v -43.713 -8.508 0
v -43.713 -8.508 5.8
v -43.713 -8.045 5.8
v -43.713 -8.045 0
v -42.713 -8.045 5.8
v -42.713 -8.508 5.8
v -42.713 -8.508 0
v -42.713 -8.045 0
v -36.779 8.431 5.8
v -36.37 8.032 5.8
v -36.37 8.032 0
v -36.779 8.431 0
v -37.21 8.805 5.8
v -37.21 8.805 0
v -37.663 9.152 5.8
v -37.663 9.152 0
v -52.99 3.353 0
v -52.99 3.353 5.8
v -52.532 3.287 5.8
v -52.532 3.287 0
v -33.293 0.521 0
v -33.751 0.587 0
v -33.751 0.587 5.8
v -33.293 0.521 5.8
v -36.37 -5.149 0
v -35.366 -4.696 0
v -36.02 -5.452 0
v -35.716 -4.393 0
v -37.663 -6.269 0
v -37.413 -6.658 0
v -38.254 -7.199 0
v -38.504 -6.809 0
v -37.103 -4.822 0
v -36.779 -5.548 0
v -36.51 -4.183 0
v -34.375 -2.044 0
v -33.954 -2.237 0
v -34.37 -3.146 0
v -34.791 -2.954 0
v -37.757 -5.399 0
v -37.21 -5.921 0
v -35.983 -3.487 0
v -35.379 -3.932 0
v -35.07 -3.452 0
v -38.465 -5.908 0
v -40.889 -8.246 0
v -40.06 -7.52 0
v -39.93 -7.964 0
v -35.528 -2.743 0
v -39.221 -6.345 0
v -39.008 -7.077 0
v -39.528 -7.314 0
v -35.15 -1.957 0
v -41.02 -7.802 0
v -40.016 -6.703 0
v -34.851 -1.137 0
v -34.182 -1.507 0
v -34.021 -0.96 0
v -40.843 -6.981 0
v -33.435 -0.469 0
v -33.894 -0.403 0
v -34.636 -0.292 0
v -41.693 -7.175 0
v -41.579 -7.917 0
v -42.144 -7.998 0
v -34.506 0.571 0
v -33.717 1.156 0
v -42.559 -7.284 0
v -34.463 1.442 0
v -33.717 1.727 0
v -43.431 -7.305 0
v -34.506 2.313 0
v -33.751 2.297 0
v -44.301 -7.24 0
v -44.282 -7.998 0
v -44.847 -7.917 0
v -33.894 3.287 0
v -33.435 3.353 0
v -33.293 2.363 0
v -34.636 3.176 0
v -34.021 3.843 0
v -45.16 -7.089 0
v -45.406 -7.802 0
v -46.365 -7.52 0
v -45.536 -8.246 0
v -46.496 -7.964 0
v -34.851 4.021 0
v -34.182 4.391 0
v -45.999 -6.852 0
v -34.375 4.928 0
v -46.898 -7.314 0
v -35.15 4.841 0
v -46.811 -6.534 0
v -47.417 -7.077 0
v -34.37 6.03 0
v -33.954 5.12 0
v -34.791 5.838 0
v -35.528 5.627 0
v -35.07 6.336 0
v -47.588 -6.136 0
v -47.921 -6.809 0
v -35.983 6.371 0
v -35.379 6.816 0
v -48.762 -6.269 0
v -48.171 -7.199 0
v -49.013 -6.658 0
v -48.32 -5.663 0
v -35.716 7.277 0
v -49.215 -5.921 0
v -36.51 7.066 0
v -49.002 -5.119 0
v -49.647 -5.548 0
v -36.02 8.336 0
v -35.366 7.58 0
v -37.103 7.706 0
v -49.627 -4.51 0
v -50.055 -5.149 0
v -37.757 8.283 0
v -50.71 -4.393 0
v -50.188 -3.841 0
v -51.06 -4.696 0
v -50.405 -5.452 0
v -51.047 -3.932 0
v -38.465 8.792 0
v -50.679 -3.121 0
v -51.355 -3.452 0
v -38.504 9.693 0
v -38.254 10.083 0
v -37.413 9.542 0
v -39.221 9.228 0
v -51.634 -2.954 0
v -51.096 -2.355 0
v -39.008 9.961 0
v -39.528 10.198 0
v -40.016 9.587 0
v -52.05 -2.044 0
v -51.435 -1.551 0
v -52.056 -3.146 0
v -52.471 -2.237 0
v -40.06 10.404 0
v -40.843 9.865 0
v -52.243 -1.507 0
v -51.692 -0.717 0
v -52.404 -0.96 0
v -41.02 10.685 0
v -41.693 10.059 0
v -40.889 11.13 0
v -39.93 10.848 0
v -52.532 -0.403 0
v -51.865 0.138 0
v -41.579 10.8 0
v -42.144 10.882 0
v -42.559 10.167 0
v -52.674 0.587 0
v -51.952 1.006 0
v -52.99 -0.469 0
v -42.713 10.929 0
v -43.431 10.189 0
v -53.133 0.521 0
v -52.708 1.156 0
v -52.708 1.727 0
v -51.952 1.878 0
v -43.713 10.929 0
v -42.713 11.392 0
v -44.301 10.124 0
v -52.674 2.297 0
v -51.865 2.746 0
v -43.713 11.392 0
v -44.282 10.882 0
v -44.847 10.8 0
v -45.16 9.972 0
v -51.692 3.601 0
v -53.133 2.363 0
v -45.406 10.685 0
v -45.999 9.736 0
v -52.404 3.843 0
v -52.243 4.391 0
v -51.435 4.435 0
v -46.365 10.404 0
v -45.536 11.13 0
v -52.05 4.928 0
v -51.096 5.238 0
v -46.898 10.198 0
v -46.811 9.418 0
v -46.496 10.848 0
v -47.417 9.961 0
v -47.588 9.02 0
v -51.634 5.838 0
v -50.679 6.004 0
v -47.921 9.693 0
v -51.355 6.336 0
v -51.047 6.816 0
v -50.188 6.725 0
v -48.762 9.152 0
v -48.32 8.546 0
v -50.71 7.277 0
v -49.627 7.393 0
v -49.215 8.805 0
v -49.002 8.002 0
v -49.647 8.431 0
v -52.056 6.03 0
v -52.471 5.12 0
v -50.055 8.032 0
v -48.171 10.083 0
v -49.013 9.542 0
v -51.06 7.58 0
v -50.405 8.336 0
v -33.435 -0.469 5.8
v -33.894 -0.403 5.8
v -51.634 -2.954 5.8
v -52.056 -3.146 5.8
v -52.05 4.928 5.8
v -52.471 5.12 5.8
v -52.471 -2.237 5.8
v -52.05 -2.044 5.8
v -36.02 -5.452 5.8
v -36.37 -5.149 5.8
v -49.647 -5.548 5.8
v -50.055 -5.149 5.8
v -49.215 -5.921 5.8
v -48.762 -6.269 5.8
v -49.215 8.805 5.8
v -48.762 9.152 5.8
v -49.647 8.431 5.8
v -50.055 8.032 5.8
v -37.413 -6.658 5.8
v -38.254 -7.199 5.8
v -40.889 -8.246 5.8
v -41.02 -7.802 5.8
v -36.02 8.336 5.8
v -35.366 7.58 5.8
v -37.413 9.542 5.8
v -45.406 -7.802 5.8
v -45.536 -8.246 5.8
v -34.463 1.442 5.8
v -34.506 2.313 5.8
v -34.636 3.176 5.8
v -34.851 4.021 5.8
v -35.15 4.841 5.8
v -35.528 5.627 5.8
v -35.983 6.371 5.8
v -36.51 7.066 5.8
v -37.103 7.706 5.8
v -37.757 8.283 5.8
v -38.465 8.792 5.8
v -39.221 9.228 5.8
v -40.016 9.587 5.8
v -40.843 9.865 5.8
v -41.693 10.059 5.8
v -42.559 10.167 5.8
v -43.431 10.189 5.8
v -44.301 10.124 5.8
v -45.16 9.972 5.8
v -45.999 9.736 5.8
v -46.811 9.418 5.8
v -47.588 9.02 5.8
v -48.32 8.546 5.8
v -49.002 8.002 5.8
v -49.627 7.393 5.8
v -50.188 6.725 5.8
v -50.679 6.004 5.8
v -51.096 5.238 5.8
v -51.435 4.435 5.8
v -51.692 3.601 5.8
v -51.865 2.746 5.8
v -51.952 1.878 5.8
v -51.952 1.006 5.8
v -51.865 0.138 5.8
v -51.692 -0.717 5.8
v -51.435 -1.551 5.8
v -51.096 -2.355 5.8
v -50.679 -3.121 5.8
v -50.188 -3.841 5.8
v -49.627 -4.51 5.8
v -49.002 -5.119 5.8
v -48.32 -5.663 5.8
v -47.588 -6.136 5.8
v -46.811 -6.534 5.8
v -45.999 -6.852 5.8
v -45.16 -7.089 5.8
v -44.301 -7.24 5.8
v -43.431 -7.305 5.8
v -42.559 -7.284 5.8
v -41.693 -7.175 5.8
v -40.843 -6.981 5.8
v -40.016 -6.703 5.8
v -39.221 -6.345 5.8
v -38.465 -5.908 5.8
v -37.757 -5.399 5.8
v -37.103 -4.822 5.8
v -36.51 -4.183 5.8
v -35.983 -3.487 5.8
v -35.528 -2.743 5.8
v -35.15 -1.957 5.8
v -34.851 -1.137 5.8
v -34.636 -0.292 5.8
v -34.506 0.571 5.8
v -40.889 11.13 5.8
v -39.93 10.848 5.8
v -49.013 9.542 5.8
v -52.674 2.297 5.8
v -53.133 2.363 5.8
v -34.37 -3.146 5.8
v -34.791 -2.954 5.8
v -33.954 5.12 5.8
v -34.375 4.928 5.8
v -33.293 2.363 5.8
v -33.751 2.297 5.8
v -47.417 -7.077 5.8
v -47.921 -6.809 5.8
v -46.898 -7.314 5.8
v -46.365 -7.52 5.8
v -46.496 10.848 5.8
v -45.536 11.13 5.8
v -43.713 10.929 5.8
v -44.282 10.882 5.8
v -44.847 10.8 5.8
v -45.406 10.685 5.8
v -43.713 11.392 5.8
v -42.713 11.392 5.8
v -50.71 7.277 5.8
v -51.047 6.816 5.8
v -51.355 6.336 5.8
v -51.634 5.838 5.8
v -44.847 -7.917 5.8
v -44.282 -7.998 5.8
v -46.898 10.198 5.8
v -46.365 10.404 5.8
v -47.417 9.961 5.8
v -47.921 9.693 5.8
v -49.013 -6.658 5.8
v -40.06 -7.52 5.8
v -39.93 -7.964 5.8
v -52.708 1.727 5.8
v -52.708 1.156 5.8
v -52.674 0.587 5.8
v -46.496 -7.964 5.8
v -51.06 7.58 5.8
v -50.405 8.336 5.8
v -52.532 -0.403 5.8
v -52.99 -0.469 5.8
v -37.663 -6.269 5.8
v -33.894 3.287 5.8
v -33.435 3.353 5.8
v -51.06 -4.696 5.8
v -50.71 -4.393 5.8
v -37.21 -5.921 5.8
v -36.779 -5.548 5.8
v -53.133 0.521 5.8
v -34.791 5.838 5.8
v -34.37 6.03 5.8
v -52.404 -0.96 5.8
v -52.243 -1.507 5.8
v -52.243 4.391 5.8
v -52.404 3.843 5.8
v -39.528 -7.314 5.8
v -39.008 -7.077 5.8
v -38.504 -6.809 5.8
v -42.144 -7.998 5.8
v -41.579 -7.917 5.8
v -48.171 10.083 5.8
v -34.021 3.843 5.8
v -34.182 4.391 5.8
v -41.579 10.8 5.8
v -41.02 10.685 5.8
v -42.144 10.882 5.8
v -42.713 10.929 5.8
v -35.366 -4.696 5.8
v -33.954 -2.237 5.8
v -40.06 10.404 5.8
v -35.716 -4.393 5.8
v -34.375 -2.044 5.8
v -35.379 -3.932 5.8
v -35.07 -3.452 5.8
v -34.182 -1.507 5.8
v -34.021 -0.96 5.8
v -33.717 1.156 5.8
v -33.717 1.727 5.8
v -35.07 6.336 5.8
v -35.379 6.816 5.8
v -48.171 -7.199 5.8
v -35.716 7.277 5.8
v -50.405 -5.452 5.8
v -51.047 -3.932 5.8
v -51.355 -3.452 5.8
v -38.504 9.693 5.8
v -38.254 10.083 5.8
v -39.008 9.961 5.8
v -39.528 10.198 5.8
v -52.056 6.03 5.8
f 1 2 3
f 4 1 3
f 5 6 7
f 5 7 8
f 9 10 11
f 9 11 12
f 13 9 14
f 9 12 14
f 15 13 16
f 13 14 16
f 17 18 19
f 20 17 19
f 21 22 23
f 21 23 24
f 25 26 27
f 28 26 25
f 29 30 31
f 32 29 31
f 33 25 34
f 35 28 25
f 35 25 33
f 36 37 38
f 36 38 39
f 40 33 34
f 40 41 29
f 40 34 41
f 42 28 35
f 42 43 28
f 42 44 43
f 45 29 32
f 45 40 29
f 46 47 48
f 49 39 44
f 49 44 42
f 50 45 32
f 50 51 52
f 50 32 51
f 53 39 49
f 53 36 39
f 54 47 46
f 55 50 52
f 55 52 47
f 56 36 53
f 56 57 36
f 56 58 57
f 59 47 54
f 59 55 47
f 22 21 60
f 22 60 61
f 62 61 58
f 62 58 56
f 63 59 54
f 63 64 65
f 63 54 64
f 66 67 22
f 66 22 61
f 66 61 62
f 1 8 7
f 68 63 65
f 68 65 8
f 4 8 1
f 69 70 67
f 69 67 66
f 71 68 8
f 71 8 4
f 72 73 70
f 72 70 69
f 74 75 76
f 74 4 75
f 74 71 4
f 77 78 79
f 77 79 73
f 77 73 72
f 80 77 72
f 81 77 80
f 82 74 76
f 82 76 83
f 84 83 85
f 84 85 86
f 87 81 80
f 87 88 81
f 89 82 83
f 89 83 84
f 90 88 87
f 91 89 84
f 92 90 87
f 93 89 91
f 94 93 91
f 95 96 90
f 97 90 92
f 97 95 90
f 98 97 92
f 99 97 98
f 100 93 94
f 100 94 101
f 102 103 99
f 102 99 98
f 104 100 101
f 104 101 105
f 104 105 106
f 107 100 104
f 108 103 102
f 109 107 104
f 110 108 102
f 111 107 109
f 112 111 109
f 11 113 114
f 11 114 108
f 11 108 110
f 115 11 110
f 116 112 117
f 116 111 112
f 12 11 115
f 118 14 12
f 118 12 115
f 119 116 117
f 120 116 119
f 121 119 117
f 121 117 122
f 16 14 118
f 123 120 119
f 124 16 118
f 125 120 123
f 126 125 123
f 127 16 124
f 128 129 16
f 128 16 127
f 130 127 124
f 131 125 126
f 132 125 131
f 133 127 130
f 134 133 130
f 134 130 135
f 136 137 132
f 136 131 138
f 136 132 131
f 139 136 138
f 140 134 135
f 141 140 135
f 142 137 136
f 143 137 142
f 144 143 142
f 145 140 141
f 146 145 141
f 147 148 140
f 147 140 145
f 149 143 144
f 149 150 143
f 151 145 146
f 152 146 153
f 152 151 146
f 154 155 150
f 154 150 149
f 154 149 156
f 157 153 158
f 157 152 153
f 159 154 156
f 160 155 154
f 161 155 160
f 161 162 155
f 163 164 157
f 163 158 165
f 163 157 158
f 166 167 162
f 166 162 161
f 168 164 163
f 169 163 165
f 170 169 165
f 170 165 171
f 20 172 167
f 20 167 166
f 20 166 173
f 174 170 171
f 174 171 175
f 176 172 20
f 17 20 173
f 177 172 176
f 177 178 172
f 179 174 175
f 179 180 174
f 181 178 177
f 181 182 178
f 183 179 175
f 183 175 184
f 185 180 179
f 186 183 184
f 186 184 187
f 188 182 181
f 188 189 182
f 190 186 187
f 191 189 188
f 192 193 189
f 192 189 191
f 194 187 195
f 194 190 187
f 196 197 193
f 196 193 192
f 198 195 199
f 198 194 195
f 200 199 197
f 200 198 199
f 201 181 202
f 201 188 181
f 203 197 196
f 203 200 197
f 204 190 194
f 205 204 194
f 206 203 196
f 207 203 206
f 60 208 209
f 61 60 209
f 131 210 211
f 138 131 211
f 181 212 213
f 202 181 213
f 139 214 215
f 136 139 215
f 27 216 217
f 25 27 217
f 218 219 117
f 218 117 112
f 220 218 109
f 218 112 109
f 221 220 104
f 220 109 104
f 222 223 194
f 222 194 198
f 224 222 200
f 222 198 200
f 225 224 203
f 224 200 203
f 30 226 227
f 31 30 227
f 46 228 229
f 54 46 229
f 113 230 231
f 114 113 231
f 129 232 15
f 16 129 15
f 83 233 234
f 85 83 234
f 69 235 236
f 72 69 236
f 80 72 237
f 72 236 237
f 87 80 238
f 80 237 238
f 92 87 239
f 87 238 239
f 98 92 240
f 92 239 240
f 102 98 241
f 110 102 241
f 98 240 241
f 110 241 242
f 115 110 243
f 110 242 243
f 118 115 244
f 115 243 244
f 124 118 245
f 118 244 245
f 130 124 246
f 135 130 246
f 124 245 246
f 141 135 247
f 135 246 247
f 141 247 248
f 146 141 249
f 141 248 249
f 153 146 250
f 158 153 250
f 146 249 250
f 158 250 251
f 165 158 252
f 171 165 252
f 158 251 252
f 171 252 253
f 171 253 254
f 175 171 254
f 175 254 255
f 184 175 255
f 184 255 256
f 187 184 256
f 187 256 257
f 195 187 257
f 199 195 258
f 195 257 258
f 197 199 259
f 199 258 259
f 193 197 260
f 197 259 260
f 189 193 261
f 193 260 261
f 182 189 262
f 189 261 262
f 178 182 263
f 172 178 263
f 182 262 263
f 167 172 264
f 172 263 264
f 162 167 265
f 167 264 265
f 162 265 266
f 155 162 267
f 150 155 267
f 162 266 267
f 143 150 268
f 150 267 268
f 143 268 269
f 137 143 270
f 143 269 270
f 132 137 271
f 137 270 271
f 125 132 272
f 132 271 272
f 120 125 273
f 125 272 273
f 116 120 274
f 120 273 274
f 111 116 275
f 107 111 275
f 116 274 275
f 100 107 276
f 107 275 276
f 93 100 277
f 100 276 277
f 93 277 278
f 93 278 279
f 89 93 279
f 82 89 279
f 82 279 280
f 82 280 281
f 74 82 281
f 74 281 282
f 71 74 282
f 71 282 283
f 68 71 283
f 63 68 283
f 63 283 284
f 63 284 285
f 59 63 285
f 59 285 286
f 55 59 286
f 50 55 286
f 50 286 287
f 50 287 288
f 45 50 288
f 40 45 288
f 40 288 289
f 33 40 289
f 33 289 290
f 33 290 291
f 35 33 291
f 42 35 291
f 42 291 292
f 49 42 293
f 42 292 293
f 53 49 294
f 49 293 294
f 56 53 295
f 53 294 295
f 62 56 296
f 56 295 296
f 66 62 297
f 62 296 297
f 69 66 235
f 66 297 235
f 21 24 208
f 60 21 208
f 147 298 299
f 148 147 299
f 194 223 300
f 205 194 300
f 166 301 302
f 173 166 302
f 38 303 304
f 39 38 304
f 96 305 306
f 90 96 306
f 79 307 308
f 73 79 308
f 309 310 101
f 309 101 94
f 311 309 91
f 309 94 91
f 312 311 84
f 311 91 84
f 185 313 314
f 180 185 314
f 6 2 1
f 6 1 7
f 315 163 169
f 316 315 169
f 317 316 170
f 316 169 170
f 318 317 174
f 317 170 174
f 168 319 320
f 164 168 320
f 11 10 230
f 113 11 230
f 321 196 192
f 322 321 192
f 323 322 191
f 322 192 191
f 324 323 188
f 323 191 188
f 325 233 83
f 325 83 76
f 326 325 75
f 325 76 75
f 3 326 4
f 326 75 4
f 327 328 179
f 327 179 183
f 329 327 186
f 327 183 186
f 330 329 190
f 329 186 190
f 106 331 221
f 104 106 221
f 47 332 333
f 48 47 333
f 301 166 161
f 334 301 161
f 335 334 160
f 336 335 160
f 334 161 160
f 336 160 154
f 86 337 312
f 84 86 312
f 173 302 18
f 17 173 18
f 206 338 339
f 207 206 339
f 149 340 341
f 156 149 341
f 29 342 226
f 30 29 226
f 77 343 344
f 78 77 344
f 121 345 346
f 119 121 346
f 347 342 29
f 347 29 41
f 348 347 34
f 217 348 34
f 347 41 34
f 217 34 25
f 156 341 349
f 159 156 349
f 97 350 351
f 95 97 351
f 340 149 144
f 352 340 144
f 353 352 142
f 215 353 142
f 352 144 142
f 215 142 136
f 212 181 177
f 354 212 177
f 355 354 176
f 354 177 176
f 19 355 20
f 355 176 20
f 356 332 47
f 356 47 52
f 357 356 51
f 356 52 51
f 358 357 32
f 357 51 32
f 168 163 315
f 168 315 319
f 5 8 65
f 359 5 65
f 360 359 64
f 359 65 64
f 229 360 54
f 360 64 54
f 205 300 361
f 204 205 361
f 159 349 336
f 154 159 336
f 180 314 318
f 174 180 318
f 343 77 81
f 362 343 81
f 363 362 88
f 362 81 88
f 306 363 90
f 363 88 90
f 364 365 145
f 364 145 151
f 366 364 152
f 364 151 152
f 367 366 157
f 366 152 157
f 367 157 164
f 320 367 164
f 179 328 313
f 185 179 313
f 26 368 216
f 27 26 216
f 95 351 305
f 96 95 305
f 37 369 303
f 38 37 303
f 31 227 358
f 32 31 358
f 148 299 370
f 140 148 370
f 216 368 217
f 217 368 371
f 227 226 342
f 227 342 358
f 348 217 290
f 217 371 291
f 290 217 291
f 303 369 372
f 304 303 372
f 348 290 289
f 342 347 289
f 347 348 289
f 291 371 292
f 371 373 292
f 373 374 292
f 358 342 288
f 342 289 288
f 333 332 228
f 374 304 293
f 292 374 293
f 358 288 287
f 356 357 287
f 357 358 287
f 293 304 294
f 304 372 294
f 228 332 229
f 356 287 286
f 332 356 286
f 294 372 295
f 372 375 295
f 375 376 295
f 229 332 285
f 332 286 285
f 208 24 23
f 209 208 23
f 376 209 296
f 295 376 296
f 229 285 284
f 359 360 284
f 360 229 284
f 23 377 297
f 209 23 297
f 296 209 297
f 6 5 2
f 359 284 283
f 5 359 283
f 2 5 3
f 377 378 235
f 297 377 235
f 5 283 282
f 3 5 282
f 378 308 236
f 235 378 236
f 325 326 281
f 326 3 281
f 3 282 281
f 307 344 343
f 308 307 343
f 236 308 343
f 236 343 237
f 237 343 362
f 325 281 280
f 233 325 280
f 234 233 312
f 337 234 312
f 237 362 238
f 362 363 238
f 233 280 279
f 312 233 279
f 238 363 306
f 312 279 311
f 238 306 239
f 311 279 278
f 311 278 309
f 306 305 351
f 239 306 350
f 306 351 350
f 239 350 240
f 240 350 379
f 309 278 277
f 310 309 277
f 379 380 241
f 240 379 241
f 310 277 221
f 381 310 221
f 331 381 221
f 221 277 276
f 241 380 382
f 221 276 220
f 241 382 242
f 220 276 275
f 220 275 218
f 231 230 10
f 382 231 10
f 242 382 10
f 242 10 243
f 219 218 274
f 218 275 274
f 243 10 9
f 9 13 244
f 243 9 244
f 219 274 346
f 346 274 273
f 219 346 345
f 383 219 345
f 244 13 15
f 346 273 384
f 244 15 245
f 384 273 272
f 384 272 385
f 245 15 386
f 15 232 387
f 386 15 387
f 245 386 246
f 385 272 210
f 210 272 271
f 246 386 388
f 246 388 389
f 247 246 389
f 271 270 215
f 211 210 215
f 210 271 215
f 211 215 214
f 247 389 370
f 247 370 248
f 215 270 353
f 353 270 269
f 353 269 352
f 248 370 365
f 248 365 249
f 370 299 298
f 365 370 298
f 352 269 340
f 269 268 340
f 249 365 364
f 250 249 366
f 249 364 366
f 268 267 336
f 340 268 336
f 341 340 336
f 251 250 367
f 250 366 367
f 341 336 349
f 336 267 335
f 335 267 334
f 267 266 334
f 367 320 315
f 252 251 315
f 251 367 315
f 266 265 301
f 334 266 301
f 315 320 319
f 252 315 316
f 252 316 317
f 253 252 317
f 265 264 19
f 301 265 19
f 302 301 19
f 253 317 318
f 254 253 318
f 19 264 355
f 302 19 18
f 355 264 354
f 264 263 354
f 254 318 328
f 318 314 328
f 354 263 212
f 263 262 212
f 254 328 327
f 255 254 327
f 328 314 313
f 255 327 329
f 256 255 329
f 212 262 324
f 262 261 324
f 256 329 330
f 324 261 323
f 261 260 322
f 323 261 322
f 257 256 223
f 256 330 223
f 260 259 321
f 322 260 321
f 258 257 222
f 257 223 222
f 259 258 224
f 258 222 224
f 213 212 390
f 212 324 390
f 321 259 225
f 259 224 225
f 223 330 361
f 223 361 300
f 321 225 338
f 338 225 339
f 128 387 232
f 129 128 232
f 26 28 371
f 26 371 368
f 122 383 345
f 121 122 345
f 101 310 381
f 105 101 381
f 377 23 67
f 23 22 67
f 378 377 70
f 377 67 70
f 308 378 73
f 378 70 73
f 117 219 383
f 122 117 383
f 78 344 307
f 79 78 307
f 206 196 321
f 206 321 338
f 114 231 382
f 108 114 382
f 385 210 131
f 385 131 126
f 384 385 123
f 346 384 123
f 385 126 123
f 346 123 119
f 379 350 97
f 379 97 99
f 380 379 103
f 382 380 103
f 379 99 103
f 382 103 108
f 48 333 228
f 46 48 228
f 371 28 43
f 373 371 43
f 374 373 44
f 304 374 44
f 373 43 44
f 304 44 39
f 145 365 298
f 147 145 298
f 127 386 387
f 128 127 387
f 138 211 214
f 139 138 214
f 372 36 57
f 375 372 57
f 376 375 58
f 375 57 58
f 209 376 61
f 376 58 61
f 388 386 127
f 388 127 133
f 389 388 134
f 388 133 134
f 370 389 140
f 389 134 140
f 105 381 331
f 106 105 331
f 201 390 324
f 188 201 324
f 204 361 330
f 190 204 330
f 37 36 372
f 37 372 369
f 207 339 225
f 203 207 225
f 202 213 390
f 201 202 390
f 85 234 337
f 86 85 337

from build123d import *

# Parameters (mm, degrees)
SKETCH1_R           = 9.5
BOSS_EXTRUDE1_DEPTH = 5.8
SKETCH2_R           = 8.75
CUT_EXTRUDE1_DEPTH  = 5.8
SKETCH3_W           = 1
SKETCH3_H           = 1
BOSS_EXTRUDE2_DEPTH = 5.8


with BuildPart() as part:
    # Sketch1 → Boss-Extrude1 (new body)
    with BuildSketch(Plane.XY):
        with Locations((-43.212664647, 1.441865661)):
            Circle(SKETCH1_R)
    extrude(amount=BOSS_EXTRUDE1_DEPTH)

    # Sketch2 → Cut-Extrude1 (cut)
    with BuildSketch(Plane.XY.offset(5.8)):
        with Locations((-43.212664647, 1.441865661)):
            Circle(SKETCH2_R)
    extrude(amount=-CUT_EXTRUDE1_DEPTH, mode=Mode.SUBTRACT)

    # Sketch3 → Boss-Extrude2 (add)
    with BuildSketch(Plane.XY.offset(5.8)):
        Polygon((-40.889172194, 11.129687027), (-39.92967922, 10.84795447), (-40.211411777, 9.888461496), (-41.170904751, 10.170194053), align=None)
        with Locations((-43.212664647, 10.891865661)):
            Rectangle(SKETCH3_W, SKETCH3_H)
        Polygon((-38.25391528, 10.082658721), (-37.412661747, 9.542017904), (-37.953302565, 8.700764371), (-38.794556098, 9.241405188), align=None)
        Polygon((-36.02038675, 8.335604751), (-35.365526016, 7.579855176), (-36.12127559, 6.924994442), (-36.776136324, 7.680744017), align=None)
        Polygon((-34.3695338, 6.030061038), (-33.954118787, 5.120429043), (-34.863750783, 4.70501403), (-35.279165796, 5.614646025), align=None)
        Polygon((-33.43509872, 3.352809023), (-33.292783882, 2.362987581), (-34.282605324, 2.220672742), (-34.424920162, 3.210494184), align=None)
        Polygon((-33.292783882, 0.520743741), (-33.43509872, -0.469077701), (-34.424920162, -0.326762863), (-34.282605324, 0.663058579), align=None)
        Polygon((-33.954118787, -2.236697721), (-34.3695338, -3.146329716), (-35.279165796, -2.730914703), (-34.863750783, -1.821282708), align=None)
        Polygon((-35.365526016, -4.696123855), (-36.02038675, -5.451873429), (-36.776136324, -4.797012695), (-36.12127559, -4.041263121), align=None)
        Polygon((-37.412661747, -6.658286582), (-38.25391528, -7.1989274), (-38.794556098, -6.357673867), (-37.953302565, -5.817033049), align=None)
        Polygon((-39.92967922, -7.964223148), (-40.889172194, -8.245955705), (-41.170904751, -7.286462731), (-40.211411777, -7.004730175), align=None)
        with Locations((-43.212664647, -8.008134339)):
            Rectangle(SKETCH3_W, SKETCH3_H)
        Polygon((-45.536157101, -8.245955705), (-46.495650075, -7.964223148), (-46.213917518, -7.004730175), (-45.254424544, -7.286462731), align=None)
        Polygon((-48.171414015, -7.1989274), (-49.012667548, -6.658286582), (-48.47202673, -5.817033049), (-47.630773197, -6.357673867), align=None)
        Polygon((-50.404942545, -5.451873429), (-51.059803279, -4.696123855), (-50.304053705, -4.041263121), (-49.649192971, -4.797012695), align=None)
        Polygon((-52.055795495, -3.146329716), (-52.471210508, -2.236697721), (-51.561578512, -1.821282708), (-51.146163499, -2.730914703), align=None)
        Polygon((-52.990230575, -0.469077701), (-53.132545413, 0.520743741), (-52.142723971, 0.663058579), (-52.000409133, -0.326762863), align=None)
        Polygon((-53.132545413, 2.362987581), (-52.990230575, 3.352809023), (-52.000409133, 3.210494184), (-52.142723971, 2.220672742), align=None)
        Polygon((-52.471210508, 5.120429043), (-52.055795495, 6.030061038), (-51.146163499, 5.614646025), (-51.561578512, 4.70501403), align=None)
        Polygon((-51.059803279, 7.579855176), (-50.404942545, 8.335604751), (-49.649192971, 7.680744017), (-50.304053705, 6.924994442), align=None)
        Polygon((-49.012667548, 9.542017904), (-48.171414015, 10.082658721), (-47.630773197, 9.241405188), (-48.47202673, 8.700764371), align=None)
        Polygon((-46.495650075, 10.84795447), (-45.536157101, 11.129687027), (-45.254424544, 10.170194053), (-46.213917518, 9.888461496), align=None)
    extrude(amount=-BOSS_EXTRUDE2_DEPTH)


solid = part.part
